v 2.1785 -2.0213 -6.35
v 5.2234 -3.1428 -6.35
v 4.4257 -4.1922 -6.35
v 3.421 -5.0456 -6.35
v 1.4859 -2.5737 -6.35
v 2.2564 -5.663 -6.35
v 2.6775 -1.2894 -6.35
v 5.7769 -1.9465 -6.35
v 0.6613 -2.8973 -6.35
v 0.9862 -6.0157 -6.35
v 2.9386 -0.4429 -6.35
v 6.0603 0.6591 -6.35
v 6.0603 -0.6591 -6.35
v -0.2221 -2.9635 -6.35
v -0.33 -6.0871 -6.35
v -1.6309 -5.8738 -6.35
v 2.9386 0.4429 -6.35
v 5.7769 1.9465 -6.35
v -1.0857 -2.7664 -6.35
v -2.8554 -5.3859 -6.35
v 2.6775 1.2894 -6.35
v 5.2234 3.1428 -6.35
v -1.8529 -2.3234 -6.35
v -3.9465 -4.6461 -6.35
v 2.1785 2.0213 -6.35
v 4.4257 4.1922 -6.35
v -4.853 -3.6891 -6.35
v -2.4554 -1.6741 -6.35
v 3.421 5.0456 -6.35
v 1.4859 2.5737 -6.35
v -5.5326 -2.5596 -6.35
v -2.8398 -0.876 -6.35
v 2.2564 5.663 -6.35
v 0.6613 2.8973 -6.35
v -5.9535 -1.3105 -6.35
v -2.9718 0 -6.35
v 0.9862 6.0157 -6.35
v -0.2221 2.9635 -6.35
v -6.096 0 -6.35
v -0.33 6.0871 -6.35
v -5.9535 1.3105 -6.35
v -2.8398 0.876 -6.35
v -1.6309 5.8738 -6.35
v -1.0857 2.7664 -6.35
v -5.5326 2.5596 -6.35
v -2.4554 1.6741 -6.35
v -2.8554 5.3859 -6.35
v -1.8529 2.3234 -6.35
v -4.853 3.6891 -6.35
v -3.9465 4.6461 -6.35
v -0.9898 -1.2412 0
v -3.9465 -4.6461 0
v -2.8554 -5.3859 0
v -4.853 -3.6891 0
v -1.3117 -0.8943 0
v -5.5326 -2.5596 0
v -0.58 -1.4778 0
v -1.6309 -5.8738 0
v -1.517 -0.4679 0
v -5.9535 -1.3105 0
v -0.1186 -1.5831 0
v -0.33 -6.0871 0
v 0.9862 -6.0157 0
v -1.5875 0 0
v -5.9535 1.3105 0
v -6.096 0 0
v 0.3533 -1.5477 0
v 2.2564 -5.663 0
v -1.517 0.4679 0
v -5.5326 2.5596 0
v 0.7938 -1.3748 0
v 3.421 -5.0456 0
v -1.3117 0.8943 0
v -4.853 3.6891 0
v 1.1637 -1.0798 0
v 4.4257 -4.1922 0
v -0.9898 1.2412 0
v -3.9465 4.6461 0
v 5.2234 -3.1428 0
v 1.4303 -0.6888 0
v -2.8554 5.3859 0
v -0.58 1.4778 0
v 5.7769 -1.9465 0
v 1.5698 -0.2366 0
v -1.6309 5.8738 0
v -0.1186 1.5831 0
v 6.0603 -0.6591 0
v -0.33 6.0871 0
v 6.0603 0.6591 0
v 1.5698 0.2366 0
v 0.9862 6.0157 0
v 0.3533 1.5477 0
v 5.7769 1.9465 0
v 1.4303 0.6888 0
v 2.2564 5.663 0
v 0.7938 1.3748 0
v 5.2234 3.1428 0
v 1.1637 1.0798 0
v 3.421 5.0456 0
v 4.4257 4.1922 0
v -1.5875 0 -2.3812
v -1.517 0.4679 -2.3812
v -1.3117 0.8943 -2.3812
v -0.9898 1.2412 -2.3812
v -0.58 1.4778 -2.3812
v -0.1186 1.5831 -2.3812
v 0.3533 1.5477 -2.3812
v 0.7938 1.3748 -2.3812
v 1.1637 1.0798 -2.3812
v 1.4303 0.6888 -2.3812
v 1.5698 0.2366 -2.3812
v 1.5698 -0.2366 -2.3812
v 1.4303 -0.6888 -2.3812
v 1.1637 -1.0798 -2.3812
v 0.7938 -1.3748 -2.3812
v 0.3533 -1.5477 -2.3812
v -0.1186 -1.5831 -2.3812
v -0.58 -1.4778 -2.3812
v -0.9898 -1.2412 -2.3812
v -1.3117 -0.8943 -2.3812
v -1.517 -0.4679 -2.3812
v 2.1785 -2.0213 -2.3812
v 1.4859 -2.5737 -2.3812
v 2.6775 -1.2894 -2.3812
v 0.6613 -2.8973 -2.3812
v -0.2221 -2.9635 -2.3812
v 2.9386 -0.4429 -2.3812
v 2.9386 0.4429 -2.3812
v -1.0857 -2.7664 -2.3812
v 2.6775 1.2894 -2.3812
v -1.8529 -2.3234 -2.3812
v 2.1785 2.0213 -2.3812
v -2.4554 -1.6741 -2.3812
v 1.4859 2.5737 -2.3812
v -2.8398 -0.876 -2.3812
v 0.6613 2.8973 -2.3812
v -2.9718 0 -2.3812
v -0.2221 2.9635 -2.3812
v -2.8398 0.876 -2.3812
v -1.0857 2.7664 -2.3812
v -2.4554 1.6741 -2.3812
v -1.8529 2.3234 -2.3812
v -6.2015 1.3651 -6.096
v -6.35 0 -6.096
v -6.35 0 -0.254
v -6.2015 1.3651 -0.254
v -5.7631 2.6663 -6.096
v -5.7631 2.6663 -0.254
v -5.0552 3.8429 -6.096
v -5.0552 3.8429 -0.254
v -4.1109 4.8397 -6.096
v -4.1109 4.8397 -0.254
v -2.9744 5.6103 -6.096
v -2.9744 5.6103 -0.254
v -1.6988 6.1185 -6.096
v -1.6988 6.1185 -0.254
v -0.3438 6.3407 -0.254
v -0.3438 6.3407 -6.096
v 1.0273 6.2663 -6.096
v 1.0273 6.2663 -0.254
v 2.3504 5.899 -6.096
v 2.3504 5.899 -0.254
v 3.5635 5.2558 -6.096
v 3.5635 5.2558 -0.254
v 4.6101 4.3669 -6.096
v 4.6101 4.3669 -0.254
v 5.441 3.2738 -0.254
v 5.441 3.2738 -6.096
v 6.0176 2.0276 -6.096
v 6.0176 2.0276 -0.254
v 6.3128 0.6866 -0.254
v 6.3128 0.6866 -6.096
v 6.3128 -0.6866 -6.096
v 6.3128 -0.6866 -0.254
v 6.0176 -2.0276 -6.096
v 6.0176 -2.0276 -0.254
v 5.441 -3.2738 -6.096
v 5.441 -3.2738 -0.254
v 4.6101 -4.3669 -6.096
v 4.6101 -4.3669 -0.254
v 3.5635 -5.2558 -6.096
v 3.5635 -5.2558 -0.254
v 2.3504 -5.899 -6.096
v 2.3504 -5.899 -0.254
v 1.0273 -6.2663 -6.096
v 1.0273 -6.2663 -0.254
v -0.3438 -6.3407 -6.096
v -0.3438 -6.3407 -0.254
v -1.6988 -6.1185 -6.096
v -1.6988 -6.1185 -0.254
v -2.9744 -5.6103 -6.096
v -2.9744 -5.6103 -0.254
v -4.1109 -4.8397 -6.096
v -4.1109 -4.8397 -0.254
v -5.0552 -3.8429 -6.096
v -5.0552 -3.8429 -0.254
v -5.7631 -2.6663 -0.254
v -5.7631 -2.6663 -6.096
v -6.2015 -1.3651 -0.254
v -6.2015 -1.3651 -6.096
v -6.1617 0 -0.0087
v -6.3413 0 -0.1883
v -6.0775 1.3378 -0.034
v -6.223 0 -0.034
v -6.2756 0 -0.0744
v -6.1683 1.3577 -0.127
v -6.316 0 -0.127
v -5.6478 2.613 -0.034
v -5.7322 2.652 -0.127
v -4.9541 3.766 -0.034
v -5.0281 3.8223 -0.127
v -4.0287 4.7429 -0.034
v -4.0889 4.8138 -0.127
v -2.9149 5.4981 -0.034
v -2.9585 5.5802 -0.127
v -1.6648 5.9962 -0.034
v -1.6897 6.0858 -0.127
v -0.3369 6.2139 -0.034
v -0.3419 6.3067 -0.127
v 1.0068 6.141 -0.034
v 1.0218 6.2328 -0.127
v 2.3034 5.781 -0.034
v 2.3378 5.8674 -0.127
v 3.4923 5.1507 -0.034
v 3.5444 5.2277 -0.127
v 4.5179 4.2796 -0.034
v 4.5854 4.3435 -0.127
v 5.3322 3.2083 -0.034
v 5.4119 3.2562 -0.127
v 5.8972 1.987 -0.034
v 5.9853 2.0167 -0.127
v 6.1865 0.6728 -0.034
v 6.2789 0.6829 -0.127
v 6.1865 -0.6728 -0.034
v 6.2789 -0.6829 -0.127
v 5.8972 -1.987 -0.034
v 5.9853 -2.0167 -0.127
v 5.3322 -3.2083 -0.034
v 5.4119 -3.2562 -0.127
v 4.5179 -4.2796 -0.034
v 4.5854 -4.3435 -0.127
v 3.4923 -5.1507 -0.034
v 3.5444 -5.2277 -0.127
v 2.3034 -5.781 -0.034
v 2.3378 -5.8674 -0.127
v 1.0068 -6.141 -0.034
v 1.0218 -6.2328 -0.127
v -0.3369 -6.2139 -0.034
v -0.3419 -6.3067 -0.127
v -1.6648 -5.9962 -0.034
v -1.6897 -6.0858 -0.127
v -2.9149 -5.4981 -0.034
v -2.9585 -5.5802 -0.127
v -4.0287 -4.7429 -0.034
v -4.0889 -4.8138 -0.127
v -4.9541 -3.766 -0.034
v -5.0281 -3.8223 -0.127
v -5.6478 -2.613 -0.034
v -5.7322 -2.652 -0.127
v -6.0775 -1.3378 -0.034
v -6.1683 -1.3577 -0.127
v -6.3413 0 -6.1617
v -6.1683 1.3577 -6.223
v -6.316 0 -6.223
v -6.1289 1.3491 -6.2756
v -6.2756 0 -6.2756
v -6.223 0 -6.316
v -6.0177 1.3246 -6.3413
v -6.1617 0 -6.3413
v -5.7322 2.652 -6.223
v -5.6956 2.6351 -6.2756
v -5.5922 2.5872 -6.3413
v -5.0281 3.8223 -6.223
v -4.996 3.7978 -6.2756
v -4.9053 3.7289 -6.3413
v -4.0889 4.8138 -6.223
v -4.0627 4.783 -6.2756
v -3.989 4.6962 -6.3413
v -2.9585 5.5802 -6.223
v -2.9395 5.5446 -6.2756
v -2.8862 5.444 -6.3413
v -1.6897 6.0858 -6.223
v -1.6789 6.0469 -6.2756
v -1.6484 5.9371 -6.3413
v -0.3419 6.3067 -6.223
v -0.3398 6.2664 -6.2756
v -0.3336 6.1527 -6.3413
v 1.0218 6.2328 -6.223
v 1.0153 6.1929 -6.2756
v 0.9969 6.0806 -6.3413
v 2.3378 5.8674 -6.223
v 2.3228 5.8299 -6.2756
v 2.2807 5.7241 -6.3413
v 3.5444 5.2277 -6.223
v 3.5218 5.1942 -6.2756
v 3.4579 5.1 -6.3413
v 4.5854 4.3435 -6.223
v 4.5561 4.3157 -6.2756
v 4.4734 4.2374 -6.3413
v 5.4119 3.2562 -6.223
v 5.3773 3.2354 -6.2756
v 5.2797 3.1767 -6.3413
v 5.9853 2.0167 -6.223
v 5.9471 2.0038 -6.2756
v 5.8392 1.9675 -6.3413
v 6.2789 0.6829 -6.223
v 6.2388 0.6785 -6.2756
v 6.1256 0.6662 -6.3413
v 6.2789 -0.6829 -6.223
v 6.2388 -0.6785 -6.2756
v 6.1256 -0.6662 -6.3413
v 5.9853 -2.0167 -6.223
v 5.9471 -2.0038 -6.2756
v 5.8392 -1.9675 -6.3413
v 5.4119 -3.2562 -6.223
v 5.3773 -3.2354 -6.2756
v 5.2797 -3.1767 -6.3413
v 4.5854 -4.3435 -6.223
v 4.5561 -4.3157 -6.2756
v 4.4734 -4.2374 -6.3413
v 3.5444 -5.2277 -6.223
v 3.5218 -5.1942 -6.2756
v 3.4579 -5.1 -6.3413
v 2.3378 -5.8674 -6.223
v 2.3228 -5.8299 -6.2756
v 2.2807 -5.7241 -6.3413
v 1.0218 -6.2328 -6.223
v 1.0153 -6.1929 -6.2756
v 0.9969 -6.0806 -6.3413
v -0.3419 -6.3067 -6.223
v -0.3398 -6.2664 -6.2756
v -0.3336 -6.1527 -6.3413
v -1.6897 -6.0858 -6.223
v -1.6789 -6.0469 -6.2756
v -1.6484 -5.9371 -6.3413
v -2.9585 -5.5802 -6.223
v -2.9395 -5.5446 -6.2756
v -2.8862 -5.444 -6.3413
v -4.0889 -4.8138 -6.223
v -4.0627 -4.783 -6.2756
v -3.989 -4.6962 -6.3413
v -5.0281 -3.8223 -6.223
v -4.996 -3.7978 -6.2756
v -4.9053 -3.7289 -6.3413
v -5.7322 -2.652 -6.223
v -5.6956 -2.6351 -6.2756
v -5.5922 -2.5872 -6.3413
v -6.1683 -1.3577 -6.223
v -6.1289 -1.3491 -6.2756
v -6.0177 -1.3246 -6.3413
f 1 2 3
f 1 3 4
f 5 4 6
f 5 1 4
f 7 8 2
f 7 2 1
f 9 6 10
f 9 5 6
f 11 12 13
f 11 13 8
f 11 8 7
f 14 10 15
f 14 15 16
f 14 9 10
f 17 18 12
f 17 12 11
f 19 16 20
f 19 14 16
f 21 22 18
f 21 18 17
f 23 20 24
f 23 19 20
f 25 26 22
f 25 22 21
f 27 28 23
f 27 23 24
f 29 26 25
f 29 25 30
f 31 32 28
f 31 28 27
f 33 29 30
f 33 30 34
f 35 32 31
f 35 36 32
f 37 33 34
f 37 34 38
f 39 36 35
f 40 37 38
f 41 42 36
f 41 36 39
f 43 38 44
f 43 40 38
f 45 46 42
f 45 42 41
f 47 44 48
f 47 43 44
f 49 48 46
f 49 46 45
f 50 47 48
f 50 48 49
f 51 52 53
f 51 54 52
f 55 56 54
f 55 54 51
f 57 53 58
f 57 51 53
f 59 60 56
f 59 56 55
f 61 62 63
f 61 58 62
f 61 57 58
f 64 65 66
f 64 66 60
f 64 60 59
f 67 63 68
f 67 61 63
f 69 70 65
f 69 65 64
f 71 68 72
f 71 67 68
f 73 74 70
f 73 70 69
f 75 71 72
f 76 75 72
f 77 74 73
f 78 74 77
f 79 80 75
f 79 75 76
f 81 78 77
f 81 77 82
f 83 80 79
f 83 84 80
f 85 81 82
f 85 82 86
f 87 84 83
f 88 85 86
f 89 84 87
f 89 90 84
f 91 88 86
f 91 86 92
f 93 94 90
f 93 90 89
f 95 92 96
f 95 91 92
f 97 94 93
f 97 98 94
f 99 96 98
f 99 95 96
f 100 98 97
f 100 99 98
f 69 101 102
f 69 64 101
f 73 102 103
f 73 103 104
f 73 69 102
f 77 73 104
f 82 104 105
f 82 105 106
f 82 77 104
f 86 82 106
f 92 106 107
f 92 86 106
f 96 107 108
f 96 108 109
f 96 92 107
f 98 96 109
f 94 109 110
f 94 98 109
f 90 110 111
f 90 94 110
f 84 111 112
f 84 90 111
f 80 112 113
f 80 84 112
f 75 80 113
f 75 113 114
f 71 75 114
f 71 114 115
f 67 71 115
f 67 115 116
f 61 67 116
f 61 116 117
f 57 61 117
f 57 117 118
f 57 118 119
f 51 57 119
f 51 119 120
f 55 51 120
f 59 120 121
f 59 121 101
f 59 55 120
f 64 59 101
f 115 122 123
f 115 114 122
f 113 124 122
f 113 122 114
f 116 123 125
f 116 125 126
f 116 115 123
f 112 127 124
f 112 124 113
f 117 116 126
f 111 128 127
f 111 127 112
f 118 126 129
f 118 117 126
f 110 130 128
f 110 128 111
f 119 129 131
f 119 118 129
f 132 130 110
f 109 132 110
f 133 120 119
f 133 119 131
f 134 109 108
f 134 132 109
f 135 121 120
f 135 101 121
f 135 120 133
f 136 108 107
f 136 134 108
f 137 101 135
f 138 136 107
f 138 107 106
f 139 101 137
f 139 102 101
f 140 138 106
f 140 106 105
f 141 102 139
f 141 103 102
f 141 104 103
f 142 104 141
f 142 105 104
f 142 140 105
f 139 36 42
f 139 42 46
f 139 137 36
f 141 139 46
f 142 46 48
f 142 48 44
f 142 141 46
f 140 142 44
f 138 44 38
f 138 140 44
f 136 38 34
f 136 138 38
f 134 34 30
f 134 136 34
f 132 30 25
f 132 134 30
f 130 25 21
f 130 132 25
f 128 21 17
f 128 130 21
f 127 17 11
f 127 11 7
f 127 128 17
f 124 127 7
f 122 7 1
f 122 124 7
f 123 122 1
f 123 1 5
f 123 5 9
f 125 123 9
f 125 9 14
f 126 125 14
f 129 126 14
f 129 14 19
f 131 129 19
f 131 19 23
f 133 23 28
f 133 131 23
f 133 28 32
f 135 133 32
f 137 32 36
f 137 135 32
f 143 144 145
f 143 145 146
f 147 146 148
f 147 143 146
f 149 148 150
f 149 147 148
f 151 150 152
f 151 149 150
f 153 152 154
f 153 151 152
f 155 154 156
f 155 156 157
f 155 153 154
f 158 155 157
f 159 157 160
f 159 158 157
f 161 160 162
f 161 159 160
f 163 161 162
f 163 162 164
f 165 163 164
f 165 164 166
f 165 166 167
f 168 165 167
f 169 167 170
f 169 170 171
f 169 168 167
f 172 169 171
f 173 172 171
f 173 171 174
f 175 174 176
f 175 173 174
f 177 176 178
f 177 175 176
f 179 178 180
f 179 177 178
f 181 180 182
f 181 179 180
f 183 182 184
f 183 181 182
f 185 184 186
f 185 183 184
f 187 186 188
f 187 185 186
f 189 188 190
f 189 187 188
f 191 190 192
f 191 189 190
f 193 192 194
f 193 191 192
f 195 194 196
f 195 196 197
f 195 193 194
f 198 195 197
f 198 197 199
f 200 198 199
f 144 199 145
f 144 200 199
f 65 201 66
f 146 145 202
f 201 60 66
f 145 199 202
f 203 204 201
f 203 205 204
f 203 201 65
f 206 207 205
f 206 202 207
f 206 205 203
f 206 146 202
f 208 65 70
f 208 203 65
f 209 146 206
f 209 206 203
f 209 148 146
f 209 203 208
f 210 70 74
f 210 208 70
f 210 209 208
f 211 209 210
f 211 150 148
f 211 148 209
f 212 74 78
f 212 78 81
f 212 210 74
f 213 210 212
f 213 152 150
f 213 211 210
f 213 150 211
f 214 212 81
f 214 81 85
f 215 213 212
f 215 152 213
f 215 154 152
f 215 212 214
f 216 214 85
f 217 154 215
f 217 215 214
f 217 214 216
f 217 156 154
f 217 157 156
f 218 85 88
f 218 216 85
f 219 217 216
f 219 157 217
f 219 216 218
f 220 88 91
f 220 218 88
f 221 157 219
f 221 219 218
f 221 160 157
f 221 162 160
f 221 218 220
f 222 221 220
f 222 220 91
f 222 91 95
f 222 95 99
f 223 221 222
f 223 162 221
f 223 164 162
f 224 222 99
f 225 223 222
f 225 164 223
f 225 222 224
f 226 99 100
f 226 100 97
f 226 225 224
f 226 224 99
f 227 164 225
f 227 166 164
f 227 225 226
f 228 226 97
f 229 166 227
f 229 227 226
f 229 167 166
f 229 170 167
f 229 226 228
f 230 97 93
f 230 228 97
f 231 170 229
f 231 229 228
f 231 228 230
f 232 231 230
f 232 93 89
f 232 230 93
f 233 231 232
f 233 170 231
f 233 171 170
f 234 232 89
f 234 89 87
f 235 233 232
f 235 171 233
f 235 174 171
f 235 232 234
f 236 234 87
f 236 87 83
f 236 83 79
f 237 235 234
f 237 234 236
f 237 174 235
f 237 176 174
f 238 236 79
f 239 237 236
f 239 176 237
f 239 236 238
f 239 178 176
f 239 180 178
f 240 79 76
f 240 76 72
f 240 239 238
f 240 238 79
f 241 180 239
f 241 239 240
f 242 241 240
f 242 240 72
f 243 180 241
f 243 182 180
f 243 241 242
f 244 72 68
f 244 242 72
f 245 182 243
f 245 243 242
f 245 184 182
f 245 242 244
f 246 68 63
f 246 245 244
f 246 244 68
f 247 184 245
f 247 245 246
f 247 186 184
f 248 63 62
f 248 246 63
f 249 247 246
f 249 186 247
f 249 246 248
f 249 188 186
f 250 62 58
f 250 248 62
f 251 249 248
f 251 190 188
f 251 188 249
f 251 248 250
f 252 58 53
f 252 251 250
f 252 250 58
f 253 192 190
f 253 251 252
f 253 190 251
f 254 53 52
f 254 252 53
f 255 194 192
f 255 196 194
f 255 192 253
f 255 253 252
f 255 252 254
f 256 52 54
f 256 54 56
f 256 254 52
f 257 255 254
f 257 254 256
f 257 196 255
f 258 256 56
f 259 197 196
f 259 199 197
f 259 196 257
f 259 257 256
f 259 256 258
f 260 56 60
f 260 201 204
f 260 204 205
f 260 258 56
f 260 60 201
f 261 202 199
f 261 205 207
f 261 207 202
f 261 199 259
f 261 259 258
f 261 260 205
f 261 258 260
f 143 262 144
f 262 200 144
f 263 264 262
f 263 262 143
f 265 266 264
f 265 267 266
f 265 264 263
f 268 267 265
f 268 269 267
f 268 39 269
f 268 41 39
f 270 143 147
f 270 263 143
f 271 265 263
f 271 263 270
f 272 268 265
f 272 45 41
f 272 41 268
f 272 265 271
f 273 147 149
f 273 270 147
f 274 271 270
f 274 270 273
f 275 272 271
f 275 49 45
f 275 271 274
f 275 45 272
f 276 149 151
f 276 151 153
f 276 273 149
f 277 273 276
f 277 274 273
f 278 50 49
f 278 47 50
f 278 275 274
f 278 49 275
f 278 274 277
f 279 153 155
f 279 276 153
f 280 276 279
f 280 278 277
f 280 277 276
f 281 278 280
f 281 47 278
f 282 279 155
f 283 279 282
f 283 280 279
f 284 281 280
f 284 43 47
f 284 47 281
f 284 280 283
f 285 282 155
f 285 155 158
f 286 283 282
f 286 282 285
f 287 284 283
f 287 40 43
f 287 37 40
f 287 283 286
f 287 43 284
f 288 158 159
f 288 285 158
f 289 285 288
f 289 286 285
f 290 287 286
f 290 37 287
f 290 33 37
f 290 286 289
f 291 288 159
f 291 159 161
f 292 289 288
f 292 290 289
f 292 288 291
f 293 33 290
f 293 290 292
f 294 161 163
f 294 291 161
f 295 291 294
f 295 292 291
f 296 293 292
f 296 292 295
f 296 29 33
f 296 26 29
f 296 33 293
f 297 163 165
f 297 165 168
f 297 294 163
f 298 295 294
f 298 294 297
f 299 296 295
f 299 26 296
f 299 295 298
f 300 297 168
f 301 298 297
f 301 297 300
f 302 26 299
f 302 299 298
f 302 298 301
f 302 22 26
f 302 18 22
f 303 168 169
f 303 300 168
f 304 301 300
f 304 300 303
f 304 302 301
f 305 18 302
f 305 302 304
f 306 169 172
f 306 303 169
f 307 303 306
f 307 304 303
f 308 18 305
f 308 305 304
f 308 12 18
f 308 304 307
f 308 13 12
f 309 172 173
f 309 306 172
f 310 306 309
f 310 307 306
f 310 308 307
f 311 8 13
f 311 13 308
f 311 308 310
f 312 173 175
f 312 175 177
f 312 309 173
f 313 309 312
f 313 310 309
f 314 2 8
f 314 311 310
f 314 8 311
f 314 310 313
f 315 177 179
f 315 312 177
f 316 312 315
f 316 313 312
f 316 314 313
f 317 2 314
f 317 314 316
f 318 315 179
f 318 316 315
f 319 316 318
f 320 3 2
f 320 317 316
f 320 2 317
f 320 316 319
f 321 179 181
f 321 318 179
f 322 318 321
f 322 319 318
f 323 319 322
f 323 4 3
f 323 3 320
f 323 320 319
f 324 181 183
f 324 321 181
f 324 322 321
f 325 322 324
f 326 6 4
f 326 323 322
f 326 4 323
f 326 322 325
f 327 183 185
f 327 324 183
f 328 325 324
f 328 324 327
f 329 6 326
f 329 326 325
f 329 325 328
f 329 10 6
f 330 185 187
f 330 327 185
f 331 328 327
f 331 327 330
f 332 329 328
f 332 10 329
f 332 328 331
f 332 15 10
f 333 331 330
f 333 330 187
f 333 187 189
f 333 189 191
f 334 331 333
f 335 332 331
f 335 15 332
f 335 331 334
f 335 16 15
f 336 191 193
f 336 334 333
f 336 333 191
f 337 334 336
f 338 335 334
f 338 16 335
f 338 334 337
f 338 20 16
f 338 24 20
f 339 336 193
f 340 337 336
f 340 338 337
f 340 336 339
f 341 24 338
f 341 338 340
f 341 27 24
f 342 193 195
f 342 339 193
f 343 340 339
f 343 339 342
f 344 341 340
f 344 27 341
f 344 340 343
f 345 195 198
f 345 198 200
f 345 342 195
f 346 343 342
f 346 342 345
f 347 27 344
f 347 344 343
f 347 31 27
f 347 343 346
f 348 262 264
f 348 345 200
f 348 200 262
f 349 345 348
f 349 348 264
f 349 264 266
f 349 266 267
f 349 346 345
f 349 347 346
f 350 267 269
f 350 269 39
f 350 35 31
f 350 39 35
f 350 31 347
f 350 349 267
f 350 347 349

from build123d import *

# Parameters (mm, degrees)
FILLET1_R = 0.254


with BuildPart() as part:
    # Sketch1 → Revolve1 (revolve)
    with BuildSketch(Plane(origin=(0, 0, 0), x_dir=(1, 0, 0), z_dir=(0, 1, 0))):
        Polygon((-1.5875, 0), (-6.35, 0), (-6.35, 6.35), (-2.9718, 6.35), (-2.9718, 2.38125), (-1.5875, 2.38125), align=None)
    revolve(axis=Axis((0, 0, 0), (0, 0, -1)))

    # Fillet1
    fillet1_edges = [part.edges().sort_by_distance(p)[0] for p in [
        (6.35, 0, 0),
        (6.35, 0, -6.35),
    ]]
    fillet(fillet1_edges, radius=FILLET1_R)


solid = part.part
